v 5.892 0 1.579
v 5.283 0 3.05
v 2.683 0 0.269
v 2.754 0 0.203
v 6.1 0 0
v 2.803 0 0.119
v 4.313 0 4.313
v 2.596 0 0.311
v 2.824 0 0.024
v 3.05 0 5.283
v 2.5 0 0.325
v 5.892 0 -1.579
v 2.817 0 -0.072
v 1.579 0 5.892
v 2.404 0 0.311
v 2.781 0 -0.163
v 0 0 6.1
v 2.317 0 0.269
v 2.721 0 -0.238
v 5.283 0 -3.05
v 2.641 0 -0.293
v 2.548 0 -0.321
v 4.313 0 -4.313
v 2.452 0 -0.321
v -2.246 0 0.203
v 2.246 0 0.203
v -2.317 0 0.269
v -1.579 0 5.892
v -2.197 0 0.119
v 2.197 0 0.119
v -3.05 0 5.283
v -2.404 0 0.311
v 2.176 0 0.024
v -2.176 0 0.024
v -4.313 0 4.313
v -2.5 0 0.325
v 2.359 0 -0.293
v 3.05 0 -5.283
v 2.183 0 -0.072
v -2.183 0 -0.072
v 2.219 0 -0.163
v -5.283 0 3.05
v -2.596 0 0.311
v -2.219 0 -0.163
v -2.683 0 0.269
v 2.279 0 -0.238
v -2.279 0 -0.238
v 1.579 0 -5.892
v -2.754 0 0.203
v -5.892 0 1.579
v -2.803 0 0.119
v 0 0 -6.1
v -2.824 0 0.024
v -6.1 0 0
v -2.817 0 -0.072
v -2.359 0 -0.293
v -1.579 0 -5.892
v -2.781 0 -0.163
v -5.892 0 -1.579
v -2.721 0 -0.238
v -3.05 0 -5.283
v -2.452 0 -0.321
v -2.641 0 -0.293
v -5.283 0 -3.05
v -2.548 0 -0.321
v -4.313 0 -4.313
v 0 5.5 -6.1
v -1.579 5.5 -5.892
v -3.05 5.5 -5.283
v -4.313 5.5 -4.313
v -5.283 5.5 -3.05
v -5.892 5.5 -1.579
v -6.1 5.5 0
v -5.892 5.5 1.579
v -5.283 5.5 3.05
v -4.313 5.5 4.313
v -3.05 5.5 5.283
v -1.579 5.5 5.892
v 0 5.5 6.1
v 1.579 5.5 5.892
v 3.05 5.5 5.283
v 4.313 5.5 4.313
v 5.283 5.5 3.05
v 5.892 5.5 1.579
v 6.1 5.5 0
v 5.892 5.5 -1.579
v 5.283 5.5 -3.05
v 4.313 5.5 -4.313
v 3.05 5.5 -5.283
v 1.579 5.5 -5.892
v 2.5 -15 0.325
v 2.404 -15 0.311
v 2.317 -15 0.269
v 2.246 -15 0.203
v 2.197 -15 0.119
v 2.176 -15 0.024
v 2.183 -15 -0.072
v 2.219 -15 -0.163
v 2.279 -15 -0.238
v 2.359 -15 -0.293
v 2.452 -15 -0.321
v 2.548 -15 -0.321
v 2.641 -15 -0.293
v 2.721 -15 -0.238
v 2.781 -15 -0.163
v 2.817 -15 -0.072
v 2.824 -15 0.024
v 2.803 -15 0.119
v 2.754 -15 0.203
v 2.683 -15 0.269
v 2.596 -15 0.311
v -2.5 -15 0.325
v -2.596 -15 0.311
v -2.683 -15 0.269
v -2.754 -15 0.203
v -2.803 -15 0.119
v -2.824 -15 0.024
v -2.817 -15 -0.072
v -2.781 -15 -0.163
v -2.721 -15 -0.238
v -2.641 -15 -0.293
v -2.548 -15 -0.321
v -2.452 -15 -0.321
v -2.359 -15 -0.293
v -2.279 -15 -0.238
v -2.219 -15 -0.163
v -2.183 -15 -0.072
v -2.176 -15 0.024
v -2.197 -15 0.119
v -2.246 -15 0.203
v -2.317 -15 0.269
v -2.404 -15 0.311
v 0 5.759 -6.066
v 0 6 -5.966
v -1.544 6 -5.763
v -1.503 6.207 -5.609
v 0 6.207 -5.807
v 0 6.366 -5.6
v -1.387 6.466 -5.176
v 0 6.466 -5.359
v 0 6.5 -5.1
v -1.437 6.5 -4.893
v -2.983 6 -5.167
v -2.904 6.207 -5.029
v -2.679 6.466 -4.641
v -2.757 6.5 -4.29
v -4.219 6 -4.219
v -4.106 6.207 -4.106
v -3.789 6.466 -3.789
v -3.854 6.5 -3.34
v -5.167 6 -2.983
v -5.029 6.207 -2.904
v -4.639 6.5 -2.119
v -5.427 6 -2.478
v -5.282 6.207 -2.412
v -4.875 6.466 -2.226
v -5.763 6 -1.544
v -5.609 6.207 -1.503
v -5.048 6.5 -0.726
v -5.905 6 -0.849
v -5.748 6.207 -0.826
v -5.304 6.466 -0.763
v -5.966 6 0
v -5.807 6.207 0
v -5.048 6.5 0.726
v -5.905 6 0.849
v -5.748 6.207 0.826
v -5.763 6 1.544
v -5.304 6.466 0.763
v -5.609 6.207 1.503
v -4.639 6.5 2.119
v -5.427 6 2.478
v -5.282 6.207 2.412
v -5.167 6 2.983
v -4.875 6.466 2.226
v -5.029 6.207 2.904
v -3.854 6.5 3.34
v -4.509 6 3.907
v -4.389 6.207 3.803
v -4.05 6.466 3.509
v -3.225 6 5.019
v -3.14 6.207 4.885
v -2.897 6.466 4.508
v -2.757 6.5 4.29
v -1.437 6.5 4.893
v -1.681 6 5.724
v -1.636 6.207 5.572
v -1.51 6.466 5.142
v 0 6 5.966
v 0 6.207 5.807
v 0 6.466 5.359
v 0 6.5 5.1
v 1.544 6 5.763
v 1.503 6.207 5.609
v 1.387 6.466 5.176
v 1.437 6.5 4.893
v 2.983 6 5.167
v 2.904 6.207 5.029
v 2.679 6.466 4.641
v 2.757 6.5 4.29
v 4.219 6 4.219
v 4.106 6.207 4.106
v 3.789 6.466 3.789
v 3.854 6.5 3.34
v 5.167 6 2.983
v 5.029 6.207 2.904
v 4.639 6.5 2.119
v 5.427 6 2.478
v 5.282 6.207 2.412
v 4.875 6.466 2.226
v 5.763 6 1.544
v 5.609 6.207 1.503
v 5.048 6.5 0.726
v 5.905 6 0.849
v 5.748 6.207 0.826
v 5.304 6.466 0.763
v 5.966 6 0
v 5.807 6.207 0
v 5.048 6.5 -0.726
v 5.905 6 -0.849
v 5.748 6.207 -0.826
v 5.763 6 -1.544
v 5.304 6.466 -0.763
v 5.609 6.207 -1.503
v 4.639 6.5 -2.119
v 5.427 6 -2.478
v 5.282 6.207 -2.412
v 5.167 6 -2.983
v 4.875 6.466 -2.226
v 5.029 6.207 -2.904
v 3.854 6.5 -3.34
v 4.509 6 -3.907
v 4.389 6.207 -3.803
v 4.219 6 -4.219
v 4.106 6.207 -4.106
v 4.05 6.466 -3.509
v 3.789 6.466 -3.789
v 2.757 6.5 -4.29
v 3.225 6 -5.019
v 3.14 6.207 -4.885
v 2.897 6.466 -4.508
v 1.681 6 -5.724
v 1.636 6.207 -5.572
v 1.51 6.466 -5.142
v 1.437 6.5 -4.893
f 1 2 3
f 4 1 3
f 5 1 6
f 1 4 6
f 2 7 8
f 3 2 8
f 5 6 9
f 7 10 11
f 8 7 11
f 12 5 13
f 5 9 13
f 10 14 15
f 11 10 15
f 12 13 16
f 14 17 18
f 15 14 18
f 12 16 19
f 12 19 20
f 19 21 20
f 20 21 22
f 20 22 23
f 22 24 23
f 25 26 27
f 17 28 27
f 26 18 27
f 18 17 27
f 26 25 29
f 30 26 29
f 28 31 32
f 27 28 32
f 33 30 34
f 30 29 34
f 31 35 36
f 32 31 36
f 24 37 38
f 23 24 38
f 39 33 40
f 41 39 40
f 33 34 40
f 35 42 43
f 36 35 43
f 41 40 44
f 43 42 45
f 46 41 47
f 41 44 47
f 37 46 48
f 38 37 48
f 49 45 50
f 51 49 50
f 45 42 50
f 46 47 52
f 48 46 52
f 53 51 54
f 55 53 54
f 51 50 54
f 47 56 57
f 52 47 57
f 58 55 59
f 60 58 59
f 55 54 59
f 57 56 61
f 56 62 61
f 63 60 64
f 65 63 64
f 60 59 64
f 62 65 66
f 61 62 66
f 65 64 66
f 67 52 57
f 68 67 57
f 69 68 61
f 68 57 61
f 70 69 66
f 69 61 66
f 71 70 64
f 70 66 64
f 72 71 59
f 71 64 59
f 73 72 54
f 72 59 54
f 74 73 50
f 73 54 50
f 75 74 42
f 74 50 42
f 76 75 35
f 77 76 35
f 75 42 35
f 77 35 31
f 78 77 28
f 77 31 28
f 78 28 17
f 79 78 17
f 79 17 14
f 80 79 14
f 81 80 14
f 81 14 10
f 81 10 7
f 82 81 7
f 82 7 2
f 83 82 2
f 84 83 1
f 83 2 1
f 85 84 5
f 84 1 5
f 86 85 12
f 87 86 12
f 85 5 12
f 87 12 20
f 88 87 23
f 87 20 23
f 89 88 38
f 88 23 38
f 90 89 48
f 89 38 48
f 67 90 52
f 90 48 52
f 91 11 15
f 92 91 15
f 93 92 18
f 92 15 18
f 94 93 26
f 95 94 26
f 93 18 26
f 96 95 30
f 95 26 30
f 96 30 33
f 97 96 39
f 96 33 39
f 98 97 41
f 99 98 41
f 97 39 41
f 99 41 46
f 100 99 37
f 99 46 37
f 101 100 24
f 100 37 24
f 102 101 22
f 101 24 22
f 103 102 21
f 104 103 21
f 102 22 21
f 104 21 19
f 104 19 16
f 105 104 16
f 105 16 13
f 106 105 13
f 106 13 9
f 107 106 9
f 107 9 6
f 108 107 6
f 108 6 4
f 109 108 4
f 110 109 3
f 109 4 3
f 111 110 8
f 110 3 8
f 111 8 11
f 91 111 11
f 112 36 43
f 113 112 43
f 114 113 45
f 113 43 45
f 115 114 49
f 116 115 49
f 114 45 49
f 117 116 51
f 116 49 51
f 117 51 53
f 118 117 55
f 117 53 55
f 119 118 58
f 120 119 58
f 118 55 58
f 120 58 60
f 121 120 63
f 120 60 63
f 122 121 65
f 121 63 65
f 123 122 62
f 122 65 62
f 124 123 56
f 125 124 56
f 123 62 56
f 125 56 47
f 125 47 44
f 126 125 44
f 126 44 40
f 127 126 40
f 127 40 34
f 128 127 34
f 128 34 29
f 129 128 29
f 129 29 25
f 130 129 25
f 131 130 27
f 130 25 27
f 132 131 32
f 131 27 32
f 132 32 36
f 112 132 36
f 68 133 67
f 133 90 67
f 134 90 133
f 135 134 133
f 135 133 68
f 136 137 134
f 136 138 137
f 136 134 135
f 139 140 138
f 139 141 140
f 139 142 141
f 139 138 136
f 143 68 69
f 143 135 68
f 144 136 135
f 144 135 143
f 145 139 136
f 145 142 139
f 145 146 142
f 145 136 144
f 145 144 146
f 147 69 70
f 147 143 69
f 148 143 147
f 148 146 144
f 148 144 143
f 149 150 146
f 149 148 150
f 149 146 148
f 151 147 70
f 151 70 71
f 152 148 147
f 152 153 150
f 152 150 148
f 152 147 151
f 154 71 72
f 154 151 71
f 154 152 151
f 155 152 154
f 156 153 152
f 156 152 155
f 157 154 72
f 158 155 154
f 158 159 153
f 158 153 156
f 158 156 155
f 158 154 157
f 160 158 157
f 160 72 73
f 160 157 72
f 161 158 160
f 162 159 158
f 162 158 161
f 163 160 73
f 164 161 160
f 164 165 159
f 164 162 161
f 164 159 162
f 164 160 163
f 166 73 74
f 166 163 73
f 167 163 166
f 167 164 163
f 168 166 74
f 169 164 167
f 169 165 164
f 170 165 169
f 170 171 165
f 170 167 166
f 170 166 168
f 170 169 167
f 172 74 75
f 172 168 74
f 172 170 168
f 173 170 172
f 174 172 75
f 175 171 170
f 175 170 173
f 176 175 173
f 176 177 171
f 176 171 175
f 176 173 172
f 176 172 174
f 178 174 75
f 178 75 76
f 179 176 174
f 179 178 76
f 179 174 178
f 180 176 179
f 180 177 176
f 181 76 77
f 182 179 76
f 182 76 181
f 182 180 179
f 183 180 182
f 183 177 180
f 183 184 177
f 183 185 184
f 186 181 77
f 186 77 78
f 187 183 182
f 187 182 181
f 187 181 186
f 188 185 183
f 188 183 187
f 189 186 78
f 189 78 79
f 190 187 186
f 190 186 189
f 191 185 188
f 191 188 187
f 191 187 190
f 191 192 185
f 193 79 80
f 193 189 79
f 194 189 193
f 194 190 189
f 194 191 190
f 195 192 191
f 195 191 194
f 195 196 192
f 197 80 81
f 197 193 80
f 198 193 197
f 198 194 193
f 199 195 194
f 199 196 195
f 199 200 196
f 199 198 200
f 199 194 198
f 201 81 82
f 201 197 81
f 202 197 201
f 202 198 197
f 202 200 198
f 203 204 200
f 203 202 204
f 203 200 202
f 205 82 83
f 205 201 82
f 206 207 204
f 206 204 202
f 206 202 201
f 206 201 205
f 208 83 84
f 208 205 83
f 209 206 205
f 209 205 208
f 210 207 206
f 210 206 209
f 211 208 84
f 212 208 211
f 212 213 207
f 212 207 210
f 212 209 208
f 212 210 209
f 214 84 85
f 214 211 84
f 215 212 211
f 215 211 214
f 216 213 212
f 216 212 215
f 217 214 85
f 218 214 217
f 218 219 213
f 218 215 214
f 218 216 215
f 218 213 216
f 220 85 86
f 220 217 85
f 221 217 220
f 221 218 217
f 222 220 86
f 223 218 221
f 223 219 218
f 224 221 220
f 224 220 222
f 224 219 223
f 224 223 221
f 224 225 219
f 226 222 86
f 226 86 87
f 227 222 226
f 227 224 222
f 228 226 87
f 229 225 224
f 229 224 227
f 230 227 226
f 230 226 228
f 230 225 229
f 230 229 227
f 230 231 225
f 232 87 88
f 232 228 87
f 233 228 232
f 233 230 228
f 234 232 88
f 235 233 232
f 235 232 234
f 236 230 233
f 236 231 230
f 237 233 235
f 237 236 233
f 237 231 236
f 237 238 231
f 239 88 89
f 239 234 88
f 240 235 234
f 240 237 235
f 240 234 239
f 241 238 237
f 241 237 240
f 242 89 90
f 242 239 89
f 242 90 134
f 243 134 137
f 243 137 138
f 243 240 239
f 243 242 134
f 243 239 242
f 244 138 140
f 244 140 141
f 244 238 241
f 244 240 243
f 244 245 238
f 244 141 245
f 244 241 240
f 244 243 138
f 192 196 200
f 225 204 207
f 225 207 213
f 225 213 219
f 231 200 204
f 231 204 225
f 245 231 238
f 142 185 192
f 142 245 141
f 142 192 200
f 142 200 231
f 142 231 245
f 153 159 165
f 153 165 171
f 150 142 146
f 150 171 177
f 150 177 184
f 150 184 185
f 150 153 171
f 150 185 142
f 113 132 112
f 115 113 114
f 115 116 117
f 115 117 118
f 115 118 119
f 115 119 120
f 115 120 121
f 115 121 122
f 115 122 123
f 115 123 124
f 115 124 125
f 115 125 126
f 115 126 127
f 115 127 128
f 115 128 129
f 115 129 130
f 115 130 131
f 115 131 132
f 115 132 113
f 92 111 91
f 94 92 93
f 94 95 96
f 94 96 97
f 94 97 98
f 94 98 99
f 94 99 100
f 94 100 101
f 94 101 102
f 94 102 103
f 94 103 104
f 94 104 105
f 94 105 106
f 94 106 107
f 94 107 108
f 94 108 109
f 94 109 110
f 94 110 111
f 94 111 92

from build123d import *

# Parameters (mm, degrees)
SKETCH2_R           = 6.1
BOSS_EXTRUDE1_DEPTH = 6.5
SKETCH3_R           = 0.325
BOSS_EXTRUDE2_DEPTH = 15
FILLET1_R           = 1


with BuildPart() as part:
    # Sketch2 → Boss-Extrude1 (new body)
    with BuildSketch(Plane(origin=(0, 0, 0), x_dir=(1, 0, 0), z_dir=(0, 1, 0))):
        with Locations(Location((0, 0, 0), (0, 0, 90))):
            Circle(SKETCH2_R)
    extrude(amount=BOSS_EXTRUDE1_DEPTH)

    # Sketch3 → Boss-Extrude2 (add)
    with BuildSketch(Plane.XZ):
        with Locations(Location((-2.5, 0, 0), (0, 0, 90))):
            Circle(SKETCH3_R)
        with Locations(Location((2.5, 0, 0), (0, 0, 90))):
            Circle(SKETCH3_R)
    extrude(amount=BOSS_EXTRUDE2_DEPTH)

    # Fillet1
    fillet1_edges = [part.edges().sort_by_distance(p)[0] for p in [
        (0, 6.5, 6.1),
    ]]
    fillet(fillet1_edges, radius=FILLET1_R)


solid = part.part
